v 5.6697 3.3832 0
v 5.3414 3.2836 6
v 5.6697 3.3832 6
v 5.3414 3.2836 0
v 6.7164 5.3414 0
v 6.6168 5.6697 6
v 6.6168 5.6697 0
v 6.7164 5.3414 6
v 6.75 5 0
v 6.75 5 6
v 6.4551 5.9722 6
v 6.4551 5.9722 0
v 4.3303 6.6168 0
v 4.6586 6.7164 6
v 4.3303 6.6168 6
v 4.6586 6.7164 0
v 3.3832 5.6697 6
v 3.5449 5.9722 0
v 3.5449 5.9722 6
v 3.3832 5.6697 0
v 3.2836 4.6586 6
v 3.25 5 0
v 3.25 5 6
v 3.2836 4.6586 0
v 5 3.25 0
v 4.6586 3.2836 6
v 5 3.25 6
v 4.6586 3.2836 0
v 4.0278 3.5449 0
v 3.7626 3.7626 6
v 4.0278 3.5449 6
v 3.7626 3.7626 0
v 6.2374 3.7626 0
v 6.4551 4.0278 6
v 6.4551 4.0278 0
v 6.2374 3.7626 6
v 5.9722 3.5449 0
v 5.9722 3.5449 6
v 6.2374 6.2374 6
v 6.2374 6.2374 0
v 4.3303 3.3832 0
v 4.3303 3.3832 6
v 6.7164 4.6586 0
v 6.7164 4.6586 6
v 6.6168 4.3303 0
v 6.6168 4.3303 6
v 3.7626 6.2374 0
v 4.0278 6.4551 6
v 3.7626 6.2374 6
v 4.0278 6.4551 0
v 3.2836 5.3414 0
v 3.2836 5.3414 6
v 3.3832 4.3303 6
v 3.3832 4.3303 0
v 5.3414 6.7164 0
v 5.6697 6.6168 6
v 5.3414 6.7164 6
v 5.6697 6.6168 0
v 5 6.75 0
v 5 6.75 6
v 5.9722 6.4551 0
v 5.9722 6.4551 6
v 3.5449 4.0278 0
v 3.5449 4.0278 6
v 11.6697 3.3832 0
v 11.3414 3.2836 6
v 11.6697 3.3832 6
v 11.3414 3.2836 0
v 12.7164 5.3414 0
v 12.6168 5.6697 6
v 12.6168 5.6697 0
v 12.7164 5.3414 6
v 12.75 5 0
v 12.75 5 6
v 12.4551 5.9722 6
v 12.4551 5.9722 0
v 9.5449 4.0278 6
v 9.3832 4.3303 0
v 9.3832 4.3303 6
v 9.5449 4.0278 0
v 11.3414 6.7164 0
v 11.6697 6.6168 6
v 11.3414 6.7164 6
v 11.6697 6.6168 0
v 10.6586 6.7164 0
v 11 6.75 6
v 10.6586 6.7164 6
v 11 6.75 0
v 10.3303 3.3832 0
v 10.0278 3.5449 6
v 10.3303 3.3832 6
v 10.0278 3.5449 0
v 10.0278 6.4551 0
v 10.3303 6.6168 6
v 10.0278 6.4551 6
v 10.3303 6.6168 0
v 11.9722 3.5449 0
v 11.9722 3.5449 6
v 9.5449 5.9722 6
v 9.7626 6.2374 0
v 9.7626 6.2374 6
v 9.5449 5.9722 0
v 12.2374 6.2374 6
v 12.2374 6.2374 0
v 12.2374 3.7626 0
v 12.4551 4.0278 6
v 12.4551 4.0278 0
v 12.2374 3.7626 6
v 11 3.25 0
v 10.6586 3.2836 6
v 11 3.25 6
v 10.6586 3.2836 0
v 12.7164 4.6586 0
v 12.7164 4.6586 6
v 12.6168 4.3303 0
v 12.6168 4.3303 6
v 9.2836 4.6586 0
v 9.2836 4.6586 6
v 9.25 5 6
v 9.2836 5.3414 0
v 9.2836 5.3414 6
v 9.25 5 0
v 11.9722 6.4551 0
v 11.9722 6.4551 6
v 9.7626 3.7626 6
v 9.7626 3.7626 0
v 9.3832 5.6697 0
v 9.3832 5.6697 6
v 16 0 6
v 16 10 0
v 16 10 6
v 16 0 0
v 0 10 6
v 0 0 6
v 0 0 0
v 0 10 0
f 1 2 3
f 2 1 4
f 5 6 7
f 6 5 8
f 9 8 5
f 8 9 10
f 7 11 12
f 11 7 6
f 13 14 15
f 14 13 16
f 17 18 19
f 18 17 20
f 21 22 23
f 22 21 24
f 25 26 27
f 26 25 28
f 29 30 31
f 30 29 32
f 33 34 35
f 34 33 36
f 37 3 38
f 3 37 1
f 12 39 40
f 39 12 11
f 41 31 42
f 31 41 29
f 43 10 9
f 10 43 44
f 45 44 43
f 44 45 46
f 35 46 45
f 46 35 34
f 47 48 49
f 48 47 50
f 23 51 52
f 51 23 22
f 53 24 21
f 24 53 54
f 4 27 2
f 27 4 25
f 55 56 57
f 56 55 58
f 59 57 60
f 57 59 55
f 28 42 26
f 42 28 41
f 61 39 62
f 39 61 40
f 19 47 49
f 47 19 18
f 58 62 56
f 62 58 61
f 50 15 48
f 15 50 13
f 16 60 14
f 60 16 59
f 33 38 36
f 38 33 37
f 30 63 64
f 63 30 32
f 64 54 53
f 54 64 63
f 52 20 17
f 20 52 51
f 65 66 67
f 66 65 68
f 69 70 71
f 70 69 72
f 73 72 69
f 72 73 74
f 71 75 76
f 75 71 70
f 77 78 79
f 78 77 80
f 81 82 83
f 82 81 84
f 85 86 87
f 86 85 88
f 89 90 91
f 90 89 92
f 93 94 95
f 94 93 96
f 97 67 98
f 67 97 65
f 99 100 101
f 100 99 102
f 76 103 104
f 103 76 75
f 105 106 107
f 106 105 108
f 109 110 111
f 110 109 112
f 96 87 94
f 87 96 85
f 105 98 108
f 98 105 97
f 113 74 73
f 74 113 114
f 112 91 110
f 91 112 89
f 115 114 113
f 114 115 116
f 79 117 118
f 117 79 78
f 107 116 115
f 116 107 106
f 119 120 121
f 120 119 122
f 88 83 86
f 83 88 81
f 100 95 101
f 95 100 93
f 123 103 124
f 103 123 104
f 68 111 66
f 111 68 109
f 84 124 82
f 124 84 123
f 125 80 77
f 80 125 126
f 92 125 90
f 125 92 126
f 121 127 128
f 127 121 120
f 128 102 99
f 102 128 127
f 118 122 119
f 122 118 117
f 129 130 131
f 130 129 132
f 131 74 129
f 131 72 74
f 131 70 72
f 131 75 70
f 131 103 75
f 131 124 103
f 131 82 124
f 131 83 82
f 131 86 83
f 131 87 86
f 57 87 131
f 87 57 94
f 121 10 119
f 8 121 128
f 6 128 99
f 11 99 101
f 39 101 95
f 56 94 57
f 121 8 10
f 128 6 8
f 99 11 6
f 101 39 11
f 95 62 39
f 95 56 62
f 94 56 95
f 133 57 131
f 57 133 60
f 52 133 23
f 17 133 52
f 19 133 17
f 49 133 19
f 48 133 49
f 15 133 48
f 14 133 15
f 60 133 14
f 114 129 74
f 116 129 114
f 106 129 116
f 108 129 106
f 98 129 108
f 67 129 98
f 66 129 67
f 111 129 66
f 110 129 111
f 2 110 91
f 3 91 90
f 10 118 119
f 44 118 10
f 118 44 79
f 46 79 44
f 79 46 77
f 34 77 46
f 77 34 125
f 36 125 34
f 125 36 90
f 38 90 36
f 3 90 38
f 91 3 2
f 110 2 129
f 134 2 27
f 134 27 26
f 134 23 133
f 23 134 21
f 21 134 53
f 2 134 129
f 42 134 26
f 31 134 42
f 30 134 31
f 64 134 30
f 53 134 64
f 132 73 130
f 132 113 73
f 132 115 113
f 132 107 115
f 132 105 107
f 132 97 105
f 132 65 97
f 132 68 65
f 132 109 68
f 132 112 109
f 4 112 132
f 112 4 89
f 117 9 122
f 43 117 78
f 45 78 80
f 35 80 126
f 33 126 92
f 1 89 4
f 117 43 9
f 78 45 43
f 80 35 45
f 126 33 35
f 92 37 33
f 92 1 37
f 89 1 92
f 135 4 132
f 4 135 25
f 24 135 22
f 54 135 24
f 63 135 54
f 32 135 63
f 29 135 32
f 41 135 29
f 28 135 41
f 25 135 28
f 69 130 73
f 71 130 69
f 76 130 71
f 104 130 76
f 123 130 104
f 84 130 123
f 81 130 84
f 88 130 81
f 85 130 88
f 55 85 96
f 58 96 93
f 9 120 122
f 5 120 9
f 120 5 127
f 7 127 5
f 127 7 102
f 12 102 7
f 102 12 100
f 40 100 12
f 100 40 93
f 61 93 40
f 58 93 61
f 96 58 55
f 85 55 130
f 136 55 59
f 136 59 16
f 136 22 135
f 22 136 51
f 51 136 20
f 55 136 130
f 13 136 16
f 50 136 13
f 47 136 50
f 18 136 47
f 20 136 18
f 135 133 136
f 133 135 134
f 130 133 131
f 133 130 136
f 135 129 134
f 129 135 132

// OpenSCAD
$fn = 32;

// ----------------------------------------------------------------------
// Micro pad: two-hole pad, 5-20 mm class
// ----------------------------------------------------------------------

// --- parameters (mm) ---
pad_l = 16;               // pad length, X
pad_w = 10;               // pad width, Y
pad_t = 6;                // pad thickness, Z
hole_d = 3.5;             // hole diameter
hole_x = 5;               // X of the first hole centre
fit_tol = 0.1;            // tolerance for press fits, mm
free_tol = 0.5;           // tolerance for clearance fits, mm

difference() {
  cube([pad_l, pad_w, pad_t]);
  for (x = [hole_x, pad_l - hole_x])
    translate([x, pad_w / 2, -1])
      cylinder(h = pad_t + 2, d = hole_d);
}
